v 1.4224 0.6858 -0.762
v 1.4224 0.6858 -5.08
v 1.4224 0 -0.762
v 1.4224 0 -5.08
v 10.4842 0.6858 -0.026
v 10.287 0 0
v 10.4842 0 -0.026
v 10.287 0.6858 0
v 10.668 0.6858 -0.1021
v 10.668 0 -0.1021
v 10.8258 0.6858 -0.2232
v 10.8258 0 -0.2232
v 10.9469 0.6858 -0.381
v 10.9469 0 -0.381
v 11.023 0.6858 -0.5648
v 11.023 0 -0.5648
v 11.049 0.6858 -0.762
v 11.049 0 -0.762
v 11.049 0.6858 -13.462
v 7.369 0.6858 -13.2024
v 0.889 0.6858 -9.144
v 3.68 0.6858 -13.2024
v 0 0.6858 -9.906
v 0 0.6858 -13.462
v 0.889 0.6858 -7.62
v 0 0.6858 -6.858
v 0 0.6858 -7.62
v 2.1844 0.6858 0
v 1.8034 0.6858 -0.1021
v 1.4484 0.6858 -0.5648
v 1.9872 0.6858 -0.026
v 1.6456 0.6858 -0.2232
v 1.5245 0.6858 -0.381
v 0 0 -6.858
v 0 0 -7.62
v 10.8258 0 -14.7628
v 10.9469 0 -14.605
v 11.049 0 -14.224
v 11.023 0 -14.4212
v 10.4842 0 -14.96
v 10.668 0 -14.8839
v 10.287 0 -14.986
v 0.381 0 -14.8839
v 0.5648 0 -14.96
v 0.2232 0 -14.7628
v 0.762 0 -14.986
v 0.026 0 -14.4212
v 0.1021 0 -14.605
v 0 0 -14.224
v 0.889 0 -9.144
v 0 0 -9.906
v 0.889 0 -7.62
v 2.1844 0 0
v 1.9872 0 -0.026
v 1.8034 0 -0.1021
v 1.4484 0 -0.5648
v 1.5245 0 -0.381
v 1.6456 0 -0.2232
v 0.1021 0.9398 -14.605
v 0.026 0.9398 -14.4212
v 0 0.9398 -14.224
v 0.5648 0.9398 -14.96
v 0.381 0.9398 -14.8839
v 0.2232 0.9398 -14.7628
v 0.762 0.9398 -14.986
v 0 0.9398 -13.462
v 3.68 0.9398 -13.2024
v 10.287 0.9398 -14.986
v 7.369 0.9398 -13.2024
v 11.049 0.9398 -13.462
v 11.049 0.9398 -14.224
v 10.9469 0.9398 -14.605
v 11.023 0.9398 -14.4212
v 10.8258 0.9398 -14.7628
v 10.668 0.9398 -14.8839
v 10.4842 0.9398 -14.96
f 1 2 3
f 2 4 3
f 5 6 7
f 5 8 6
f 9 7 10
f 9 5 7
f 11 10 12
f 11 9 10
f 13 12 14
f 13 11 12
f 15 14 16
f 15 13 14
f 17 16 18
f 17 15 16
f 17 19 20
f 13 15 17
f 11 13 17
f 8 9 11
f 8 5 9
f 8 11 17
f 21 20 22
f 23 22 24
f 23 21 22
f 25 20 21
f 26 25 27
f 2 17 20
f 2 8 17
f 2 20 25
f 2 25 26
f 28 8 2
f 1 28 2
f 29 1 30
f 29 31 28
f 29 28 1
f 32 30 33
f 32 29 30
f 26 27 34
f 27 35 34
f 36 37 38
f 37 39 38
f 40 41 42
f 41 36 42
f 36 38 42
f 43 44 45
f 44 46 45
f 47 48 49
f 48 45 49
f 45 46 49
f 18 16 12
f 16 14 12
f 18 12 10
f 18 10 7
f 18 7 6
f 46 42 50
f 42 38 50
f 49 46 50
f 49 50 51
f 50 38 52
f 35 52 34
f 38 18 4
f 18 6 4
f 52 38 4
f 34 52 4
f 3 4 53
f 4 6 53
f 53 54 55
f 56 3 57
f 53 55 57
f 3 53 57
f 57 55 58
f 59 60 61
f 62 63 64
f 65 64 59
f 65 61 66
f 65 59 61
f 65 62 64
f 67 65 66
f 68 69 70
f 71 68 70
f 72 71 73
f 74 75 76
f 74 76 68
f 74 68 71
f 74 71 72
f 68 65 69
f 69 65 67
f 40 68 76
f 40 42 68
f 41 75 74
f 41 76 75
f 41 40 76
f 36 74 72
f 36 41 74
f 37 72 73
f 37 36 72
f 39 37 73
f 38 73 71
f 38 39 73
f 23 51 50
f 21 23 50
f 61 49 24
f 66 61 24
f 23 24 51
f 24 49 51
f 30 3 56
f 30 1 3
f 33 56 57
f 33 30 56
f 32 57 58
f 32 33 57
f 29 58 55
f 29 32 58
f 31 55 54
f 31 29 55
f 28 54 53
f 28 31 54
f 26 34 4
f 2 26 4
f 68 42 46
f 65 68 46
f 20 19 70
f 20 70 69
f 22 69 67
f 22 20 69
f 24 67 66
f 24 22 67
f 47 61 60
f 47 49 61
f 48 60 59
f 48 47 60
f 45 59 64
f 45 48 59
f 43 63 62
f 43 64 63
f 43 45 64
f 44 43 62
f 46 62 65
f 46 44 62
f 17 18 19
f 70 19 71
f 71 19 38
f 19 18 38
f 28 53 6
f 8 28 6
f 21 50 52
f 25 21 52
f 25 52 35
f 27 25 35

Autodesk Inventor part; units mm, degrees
ref_plane "YZ Plane" through (0, 0, 0) normal (1, 0, 0) x (0, 1, 0)
ref_plane "XZ Plane" through (0, 0, 0) normal (0, 1, 0) x (-1, 0, 0)
ref_plane "XY Plane" through (0, 0, 0) normal (0, 0, 1) x (1, 0, 0)
sketch "Sketch1" plane through (0, 0, 0) normal (0, 1, 0) x (-1, 0, 0)
  line L0 (-1.4224, 0) -> (-11.049, 0)
  line L1 (-11.049, 0) -> (-11.049, -14.986)
  line L2 (-11.049, -14.986) -> (0, -14.986)
  line L3 (0, -14.986) -> (0, -9.906)
  line L4 (0, -9.906) -> (-0.889, -9.144)
  line L5 (-0.889, -9.144) -> (-0.889, -7.62)
  line L6 (-0.889, -7.62) -> (0, -7.62)
  line L7 (0, -7.62) -> (0, -6.858)
  line L8 (0, -6.858) -> (-1.4224, -5.08)
  line L9 (-1.4224, -5.08) -> (-1.4224, 0)
  point P0 (0, 0)
  dimension "d0" = 14.986
  dimension "d1" = 11.049
  dimension "d2" = 9.6266
  dimension "d3" = 0.889
  dimension "d4" = 5.08
  dimension "d5" = 7.62
  dimension "d6" = 0.762
  dimension "d7" = 1.778
  dimension "d8" = 5.08
extrude "Extrusion1" add sketch "Sketch1" along normal blind 0.6858
fillet "Fillet1" radius 0.762 4 edges at (11.049, 0.3429, -14.986) (0, 0.3429, -14.986) (11.049, 0.3429, 0) (1.4224, 0.3429, 0)
sketch "Sketch2" plane through (0, 0.6858, 0) normal (0, 1, 0) x (1, 0, 0)
  arc A0 (1.4224, 0.762) -> (2.1844, 0) centre (2.1844, 0.762) ccw projected
  line L0 (2.1844, 0) -> (10.287, 0) projected
  arc A1 (10.287, 0) -> (11.049, 0.762) centre (10.287, 0.762) ccw projected
  line L1 (11.049, 0.762) -> (11.049, 14.224) projected
  arc A2 (11.049, 14.224) -> (10.287, 14.986) centre (10.287, 14.224) ccw projected
  line L2 (10.287, 14.986) -> (0.762, 14.986) projected
  arc A3 (0.762, 14.986) -> (0, 14.224) centre (0.762, 14.224) ccw projected
  line L3 (0, 14.224) -> (0, 9.906) projected
  line L4 (0, 9.906) -> (0.889, 9.144) projected
  line L5 (0.889, 9.144) -> (0.889, 7.62) projected
  line L6 (0.889, 7.62) -> (0, 7.62) projected
  line L7 (0, 7.62) -> (0, 6.858) projected
  line L8 (0, 6.858) -> (1.4224, 5.08) projected
  line L9 (1.4224, 5.08) -> (1.4224, 0.762) projected
  line L10 (0, 14.224) -> (0, 9.906) projected
  arc A4 (0, 13.462) -> (11.049, 13.462) centre (5.5245, 65.5585) ccw
  point P0 (0, 0)
  dimension "d12" = 1.524
  dimension "d13" = 1.8161
extrude "Extrusion2" add sketch "Sketch2" along normal blind 0.254 contours A4 L3 A3 L2 A2 L1
properties part number "MicroSD Card"
